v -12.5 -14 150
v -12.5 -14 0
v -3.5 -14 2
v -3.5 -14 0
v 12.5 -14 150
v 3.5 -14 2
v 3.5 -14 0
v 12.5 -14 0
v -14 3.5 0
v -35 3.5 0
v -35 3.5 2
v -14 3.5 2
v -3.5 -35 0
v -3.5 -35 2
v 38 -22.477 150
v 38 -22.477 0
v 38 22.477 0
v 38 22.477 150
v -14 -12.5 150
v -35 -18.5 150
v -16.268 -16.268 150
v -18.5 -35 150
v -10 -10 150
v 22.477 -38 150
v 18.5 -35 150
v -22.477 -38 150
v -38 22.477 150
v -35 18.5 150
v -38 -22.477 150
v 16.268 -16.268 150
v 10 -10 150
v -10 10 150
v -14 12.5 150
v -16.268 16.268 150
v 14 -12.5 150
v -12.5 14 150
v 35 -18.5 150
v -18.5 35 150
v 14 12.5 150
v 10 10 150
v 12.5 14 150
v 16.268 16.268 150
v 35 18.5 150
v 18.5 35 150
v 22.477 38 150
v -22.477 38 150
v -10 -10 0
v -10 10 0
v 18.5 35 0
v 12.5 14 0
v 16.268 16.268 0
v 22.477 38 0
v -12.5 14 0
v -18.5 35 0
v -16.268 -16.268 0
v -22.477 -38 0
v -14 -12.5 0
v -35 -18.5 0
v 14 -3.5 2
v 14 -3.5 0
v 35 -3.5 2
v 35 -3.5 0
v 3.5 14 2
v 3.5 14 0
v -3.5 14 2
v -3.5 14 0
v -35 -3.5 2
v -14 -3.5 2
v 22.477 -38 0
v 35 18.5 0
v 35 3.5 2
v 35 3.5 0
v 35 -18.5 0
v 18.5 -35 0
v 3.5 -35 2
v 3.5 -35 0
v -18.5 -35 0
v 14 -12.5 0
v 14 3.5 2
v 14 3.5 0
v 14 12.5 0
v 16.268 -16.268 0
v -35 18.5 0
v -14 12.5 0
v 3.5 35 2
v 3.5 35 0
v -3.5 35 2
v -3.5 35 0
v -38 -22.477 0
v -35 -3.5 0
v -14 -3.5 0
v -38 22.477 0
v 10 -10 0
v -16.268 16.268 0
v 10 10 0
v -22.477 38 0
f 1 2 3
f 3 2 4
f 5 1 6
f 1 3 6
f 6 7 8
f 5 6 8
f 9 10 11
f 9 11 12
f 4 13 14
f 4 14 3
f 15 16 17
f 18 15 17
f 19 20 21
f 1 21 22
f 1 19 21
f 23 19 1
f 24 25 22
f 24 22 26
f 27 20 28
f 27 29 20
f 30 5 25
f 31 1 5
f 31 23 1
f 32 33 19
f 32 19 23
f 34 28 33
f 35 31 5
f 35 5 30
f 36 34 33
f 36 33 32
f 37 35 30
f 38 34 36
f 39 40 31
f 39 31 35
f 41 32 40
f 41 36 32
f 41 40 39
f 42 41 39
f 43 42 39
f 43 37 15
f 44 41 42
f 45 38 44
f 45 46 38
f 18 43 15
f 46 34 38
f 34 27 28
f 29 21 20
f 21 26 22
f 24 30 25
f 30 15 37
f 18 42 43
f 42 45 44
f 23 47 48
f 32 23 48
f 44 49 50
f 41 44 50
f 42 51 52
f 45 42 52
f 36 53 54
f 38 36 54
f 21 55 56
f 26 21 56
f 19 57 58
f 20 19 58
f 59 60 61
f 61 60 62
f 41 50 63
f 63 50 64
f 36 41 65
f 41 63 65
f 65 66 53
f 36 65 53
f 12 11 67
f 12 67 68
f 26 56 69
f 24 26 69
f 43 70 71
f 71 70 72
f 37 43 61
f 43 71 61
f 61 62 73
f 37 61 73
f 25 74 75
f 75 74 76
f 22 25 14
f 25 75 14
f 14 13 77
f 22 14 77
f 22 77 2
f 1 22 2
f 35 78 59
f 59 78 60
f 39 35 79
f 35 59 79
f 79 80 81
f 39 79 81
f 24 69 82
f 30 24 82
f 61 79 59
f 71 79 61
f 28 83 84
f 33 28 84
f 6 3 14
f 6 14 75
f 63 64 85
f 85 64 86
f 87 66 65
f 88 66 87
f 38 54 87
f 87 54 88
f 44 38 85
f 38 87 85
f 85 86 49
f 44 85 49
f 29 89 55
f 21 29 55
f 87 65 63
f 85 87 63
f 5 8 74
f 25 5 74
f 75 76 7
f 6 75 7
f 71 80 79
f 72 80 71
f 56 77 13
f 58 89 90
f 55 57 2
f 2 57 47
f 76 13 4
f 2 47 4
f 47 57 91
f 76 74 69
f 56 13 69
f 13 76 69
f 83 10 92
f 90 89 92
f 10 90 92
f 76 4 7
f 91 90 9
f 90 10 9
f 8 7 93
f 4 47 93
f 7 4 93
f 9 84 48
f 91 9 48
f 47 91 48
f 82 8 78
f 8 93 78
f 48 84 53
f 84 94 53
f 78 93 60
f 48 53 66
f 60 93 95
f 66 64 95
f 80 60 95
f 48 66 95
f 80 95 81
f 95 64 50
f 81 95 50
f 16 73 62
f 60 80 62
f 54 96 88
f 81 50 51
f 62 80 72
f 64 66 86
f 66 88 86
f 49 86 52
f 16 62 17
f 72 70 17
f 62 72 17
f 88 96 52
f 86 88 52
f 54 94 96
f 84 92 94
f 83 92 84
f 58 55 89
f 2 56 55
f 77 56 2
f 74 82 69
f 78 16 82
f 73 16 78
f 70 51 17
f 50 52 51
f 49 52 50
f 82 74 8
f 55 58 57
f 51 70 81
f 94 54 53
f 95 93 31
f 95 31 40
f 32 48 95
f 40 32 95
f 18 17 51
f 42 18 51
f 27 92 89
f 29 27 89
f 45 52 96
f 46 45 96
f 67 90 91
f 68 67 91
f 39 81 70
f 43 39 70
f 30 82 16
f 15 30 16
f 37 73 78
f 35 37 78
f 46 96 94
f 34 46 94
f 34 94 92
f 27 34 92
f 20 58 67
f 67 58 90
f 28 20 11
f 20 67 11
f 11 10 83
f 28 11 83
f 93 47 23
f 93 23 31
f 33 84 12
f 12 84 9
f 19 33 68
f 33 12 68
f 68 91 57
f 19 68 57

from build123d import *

# Parameters (mm, degrees)
SKETCH1_W           = 20
SKETCH1_H           = 20
BOSS_EXTRUDE1_DEPTH = 150
SKETCH2_W           = 7
SKETCH2_H           = 21
SKETCH2_W_2         = 21
SKETCH2_H_2         = 7
BOSS_EXTRUDE2_DEPTH = 2


with BuildPart() as part:
    # Sketch1 → Boss-Extrude1 (new body)
    with BuildSketch(Plane.XY):
        Polygon((22.477189953, 38), (-22.477189953, 38), (-16.268065934, 16.268065934), (-38, 22.477189953), (-38, -22.477189953), (-16.268065934, -16.268065934), (-22.477189953, -38), (22.477189953, -38), (16.268065934, -16.268065934), (38, -22.477189953), (38, 22.477189953), (16.268065934, 16.268065934), align=None)
        Polygon((12.5, 14), (-12.5, 14), (-18.5, 35), (18.5, 35), align=None, mode=Mode.SUBTRACT)
        Rectangle(SKETCH1_W, SKETCH1_H, mode=Mode.SUBTRACT)
        Polygon((14, -12.5), (14, 12.5), (35, 18.5), (35, -18.5), align=None, mode=Mode.SUBTRACT)
        Polygon((-12.5, -14), (12.5, -14), (18.5, -35), (-18.5, -35), align=None, mode=Mode.SUBTRACT)
        Polygon((-14, 12.5), (-14, -12.5), (-35, -18.5), (-35, 18.5), align=None, mode=Mode.SUBTRACT)
    extrude(amount=BOSS_EXTRUDE1_DEPTH)

    # Sketch2 → Boss-Extrude2 (add)
    with BuildSketch(Plane.XY):
        with Locations((0, 24.5)):
            Rectangle(SKETCH2_W, SKETCH2_H)
        with Locations((24.5, 0)):
            Rectangle(SKETCH2_W_2, SKETCH2_H_2)
        with Locations((0, -24.5)):
            Rectangle(SKETCH2_W, SKETCH2_H)
        with Locations((-24.5, 0)):
            Rectangle(SKETCH2_W_2, SKETCH2_H_2)
    extrude(amount=BOSS_EXTRUDE2_DEPTH)


solid = part.part
